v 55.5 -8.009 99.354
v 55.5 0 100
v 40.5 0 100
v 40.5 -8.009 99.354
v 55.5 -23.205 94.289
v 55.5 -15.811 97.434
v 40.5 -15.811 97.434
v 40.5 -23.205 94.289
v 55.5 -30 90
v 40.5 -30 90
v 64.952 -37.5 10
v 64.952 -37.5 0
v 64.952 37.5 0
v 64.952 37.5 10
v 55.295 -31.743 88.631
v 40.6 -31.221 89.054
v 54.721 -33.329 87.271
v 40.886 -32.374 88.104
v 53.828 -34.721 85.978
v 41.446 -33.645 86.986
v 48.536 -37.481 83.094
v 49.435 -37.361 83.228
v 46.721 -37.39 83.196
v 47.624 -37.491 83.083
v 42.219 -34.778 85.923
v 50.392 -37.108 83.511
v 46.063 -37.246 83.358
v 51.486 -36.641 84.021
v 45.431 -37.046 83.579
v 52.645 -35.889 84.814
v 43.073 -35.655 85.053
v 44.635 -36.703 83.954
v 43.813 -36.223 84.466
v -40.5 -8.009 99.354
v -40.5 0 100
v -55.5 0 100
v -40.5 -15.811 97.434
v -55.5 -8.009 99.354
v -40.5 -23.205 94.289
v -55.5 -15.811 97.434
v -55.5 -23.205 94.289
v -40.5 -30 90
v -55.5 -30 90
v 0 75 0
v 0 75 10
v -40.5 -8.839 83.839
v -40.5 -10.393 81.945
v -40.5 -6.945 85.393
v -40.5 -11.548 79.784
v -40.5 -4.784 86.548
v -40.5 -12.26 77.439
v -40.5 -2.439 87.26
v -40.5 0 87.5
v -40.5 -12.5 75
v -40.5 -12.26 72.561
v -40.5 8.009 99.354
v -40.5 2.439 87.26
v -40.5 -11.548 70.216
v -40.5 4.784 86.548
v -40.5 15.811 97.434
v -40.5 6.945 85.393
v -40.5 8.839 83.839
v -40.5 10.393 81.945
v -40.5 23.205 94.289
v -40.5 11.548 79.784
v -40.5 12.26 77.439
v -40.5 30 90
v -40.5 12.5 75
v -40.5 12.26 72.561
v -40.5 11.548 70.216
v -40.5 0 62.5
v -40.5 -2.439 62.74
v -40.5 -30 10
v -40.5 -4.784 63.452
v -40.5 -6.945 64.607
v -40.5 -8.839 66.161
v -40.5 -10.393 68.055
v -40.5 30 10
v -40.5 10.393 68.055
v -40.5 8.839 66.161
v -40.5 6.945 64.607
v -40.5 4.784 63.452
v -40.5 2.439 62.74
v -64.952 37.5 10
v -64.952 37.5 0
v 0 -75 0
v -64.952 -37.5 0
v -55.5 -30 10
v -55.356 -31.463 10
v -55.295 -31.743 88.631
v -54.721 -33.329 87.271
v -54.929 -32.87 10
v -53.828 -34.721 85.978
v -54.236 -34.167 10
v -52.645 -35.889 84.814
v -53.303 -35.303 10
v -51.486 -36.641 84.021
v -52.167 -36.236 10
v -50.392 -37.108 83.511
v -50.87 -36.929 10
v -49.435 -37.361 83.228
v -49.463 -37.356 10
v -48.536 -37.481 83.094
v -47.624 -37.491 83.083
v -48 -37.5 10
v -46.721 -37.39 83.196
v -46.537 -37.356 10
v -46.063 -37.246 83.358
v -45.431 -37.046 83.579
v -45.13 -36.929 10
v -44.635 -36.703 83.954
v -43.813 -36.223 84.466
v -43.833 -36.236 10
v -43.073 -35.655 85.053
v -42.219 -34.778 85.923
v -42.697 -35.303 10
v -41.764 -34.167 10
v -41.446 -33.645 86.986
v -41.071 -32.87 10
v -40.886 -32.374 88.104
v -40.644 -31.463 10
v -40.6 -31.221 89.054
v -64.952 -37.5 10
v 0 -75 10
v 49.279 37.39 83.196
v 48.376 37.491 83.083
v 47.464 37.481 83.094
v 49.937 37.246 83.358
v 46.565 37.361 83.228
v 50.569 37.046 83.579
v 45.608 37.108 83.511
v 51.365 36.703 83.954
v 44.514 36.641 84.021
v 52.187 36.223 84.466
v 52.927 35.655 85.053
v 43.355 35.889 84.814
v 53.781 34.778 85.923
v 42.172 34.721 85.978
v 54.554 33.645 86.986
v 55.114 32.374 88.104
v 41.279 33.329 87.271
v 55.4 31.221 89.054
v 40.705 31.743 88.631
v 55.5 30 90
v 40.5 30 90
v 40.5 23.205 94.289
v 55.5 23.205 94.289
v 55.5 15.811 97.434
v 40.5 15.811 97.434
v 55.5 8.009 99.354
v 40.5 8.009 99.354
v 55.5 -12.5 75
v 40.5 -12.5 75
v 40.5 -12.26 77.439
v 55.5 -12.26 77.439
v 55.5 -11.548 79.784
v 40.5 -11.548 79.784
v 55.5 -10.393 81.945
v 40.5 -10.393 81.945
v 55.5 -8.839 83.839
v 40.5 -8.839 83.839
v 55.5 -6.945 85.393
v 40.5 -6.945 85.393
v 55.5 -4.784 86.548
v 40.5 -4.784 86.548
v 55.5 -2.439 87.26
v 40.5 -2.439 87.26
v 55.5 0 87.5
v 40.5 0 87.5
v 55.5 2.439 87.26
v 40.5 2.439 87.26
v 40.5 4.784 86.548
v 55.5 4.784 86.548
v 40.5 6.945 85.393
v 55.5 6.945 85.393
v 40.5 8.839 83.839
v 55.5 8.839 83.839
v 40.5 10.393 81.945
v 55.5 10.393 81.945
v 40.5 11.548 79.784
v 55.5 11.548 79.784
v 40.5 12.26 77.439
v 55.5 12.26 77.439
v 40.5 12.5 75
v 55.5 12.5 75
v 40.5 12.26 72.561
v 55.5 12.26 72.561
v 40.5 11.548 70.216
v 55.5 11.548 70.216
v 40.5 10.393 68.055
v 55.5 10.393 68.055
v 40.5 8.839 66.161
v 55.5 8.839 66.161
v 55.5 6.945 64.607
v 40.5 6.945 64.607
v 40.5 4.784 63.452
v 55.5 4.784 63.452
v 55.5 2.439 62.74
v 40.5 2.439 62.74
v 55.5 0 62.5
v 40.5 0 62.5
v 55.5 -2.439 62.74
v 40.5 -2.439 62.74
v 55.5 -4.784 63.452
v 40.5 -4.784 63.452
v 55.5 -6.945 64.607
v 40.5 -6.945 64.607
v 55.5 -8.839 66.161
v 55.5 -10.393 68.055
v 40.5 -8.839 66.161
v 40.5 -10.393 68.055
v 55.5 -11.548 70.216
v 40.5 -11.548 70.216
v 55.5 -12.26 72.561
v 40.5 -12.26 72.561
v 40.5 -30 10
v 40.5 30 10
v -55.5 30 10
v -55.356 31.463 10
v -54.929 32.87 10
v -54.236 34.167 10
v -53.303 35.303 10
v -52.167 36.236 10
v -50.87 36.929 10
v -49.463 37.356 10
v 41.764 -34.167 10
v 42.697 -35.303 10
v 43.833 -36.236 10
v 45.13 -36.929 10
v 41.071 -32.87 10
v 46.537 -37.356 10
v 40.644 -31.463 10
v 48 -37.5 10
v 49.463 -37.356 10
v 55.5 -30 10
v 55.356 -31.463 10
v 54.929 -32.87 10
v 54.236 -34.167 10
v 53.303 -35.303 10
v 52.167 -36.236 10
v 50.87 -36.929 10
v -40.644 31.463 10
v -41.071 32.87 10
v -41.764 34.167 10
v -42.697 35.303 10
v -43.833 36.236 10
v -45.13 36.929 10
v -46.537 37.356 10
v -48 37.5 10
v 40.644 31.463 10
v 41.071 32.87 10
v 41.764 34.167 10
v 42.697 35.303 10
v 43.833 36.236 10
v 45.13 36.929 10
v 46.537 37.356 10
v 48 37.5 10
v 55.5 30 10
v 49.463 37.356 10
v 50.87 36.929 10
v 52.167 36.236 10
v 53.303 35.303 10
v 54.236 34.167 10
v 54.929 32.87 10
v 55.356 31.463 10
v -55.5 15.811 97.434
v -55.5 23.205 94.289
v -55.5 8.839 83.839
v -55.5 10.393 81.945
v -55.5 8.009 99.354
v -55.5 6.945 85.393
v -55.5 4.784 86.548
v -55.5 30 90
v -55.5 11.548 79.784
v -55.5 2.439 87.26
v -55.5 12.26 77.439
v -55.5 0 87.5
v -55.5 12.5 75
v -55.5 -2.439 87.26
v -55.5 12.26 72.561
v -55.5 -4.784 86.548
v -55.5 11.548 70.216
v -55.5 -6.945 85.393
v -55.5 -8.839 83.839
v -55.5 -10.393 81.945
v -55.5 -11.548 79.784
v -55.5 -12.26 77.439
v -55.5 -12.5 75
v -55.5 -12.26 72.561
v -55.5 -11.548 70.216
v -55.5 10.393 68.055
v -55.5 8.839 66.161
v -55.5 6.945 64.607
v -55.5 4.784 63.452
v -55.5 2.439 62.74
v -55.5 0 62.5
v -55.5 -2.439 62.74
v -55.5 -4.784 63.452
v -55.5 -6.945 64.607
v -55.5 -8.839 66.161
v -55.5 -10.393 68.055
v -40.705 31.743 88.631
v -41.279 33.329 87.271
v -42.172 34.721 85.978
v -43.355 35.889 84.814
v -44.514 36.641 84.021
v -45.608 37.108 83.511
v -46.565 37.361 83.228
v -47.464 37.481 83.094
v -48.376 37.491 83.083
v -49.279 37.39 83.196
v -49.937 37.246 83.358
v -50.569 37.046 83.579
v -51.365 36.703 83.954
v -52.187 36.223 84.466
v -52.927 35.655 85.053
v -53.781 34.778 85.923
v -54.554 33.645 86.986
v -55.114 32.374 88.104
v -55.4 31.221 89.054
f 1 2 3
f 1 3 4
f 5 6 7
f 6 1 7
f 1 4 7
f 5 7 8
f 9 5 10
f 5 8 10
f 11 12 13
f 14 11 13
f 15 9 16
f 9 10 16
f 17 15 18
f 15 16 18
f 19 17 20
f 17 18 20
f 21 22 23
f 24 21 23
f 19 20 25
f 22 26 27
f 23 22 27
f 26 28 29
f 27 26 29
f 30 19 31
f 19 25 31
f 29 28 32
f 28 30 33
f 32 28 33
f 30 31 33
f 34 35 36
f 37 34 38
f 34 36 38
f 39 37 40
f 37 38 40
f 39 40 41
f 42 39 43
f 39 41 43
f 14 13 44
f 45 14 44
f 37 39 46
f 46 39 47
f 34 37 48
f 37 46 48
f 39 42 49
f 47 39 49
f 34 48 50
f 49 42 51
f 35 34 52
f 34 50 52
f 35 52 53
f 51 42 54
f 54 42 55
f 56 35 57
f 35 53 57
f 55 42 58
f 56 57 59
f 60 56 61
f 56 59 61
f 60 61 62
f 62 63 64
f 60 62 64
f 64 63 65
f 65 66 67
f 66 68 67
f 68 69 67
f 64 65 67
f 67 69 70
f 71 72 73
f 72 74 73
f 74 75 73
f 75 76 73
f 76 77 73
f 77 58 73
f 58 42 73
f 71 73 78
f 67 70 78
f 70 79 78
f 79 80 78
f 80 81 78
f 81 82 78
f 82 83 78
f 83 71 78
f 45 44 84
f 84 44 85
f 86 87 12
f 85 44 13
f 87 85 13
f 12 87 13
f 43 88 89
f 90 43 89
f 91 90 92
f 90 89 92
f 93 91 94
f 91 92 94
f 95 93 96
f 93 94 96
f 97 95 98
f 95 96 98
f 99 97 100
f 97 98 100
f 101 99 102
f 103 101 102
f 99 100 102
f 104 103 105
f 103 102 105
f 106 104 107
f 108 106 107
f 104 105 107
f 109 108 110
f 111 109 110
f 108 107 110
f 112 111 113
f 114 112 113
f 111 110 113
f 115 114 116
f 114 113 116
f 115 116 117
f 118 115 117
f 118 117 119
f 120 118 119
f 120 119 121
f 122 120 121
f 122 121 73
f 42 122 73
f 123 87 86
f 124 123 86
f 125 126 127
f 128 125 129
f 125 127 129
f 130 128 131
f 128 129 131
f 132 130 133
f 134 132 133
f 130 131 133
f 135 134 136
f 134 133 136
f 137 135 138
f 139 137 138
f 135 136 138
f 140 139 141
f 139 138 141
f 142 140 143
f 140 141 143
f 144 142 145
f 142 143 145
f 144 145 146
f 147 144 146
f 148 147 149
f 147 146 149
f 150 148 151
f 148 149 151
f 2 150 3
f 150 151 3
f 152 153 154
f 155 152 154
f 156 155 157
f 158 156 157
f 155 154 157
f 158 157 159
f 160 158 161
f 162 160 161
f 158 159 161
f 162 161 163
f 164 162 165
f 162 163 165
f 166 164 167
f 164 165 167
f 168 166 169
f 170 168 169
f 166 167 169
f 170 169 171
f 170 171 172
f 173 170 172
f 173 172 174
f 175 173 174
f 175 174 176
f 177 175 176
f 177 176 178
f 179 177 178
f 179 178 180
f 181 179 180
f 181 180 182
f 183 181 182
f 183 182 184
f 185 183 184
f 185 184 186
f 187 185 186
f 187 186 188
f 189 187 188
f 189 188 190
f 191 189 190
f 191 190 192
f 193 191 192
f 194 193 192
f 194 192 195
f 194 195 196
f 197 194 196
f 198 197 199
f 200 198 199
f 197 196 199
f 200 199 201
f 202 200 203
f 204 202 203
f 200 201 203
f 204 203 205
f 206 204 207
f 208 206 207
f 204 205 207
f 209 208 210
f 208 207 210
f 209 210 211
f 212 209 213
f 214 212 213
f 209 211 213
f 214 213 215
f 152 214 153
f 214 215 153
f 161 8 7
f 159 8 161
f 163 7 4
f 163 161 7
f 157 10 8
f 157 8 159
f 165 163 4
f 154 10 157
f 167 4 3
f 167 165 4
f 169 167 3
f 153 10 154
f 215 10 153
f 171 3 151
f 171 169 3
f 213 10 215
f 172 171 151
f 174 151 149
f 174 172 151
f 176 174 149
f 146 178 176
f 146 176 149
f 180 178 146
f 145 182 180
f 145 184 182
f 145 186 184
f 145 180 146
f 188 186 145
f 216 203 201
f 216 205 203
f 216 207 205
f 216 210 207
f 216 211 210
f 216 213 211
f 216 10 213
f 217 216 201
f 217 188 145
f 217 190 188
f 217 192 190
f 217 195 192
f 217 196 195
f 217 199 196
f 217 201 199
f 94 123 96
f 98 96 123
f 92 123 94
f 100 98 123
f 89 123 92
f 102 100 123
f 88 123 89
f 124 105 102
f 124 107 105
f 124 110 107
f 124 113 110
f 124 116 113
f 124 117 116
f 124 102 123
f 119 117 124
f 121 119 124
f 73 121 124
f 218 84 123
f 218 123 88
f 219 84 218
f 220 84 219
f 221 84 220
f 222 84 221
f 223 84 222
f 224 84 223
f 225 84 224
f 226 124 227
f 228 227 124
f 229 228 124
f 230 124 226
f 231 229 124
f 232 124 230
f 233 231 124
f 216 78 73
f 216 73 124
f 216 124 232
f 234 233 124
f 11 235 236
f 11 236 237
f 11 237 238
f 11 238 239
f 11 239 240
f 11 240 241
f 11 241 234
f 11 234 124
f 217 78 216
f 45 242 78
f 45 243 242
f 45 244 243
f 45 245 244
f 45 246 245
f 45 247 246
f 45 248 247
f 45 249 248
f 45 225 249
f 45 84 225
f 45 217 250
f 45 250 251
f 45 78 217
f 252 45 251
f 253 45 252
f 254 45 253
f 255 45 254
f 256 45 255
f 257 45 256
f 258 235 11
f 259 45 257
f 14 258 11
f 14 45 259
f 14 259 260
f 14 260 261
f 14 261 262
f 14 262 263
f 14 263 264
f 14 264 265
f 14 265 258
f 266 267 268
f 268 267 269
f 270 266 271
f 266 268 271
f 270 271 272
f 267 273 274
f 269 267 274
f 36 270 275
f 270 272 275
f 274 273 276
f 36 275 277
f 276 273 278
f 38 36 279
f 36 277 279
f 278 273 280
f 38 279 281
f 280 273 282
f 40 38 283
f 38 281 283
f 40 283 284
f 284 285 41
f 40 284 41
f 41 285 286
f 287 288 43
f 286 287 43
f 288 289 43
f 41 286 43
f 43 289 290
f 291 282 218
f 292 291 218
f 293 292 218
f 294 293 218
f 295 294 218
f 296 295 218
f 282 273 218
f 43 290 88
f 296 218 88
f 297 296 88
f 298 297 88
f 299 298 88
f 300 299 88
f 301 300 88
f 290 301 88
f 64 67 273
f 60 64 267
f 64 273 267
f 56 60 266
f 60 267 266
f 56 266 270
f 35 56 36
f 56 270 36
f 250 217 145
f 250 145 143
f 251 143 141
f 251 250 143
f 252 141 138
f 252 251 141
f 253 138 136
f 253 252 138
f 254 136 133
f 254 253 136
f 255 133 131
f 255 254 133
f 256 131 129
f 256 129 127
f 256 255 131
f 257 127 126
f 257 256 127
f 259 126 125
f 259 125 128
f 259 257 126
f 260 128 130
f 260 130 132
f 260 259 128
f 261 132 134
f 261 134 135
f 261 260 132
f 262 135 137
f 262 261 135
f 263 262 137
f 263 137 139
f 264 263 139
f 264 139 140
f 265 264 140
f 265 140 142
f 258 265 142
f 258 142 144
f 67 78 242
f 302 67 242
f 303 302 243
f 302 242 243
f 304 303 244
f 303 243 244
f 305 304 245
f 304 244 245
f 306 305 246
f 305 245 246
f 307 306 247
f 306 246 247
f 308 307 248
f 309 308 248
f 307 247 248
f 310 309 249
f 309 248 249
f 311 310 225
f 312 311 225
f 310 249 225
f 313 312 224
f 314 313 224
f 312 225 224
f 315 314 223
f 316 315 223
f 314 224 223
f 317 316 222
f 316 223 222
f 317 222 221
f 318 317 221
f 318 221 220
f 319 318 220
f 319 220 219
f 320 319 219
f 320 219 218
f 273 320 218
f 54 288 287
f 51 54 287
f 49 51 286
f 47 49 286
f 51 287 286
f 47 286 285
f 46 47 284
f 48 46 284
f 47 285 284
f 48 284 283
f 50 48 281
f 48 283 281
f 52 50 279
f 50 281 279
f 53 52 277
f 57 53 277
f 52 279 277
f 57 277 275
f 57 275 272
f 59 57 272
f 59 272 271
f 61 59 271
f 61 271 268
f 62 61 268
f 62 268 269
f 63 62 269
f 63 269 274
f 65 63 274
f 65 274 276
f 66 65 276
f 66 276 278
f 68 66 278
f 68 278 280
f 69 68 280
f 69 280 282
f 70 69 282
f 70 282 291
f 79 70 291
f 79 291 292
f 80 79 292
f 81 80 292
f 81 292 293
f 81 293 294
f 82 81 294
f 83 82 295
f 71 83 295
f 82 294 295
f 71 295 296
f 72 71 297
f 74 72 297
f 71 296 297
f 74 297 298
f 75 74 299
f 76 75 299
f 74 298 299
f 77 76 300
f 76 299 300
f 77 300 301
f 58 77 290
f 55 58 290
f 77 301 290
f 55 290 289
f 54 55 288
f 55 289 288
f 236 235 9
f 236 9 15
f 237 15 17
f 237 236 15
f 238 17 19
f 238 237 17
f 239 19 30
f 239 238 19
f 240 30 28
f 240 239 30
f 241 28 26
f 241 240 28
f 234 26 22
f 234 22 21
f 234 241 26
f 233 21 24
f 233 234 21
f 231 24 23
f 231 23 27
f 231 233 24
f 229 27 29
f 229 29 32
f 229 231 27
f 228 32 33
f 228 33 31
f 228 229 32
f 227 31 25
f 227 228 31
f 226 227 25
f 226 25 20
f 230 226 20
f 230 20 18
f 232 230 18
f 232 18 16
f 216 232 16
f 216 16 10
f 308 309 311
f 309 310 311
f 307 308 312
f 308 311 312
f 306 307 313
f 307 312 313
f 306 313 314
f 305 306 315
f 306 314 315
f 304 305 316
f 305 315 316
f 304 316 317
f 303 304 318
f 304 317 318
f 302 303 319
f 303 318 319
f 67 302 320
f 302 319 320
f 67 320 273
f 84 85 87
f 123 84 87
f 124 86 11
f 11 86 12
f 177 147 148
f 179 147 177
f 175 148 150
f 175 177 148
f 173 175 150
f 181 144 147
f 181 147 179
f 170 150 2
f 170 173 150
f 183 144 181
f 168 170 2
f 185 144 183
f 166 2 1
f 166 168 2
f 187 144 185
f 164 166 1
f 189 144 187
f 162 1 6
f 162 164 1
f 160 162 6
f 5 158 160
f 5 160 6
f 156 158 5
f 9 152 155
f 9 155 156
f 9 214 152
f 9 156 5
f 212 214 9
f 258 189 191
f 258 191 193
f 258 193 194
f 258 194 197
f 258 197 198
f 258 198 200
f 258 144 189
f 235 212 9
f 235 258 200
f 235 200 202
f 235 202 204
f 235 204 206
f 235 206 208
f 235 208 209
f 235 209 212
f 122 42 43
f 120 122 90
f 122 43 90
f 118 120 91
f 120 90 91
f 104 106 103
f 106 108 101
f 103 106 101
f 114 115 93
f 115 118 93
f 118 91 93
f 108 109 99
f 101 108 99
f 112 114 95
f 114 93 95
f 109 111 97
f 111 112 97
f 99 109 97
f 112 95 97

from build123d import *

# Parameters (mm, degrees)
F1_DEPTH = 10
F3_DEPTH = 90
F4_R     = 12.5
F5_DEPTH = 120.4529052838


# Not quite as in the source:
# - a pattern or mirror of a feature is missing from the dataset's text; its kind, count and spacing are read off the source's solid


with BuildPart() as f1:
    # F0 (on Top) → F1 (new body)
    with BuildSketch(Plane.XY):
        Polygon((-64.9519052838, -37.5), (0, -75), (64.9519052838, -37.5), (64.9519052838, 37.5), (0, 75), (-64.9519052838, 37.5), align=None)
    extrude(amount=F1_DEPTH)

    # F2 (on face) → F3 (join)
    with BuildSketch(Plane.XY.offset(10)):
        with BuildLine():
            Line((-40.5, -30), (-40.5, 0))
            ThreePointArc((-40.5, 0), (-48, -7.5), (-55.5, 0))
            Line((-55.5, 0), (-55.5, -30))
            ThreePointArc((-55.5, -30), (-48, -37.5), (-40.5, -30))
        make_face()
        with BuildLine():
            ThreePointArc((-55.5, 0), (-48, -7.5), (-40.5, 0))
            ThreePointArc((-40.5, 0), (-48, 7.5), (-55.5, 0))
        make_face()
        with BuildLine():
            ThreePointArc((-55.5, 0), (-48, 7.5), (-40.5, 0))
            Line((-40.5, 0), (-40.5, 30))
            ThreePointArc((-40.5, 30), (-48, 37.5), (-55.5, 30))
            Line((-55.5, 30), (-55.5, 0))
        make_face()
    f3 = extrude(amount=F3_DEPTH)

    # F3_copies: F3 across plane
    add(f3.mirror(Plane(origin=(0, 0, 0), x_dir=(0, 0, 1), z_dir=(1, 0, 0))))

    # F4 (on face) → F5 (cut, through all)
    with BuildSketch(Plane(origin=(-55.5, 0, 0), x_dir=(0, -1, 0), z_dir=(-1, 0, 0))):
        with BuildLine():
            ThreePointArc((-38, 82.4961536185), (-34.2063872344, 86.4681103482), (-30, 90))
            Line((-30, 90), (-30, 100))
            Line((-30, 100), (-38, 100))
            Line((-38, 100), (-38, 82.4961536185))
        make_face()
        with BuildLine():
            ThreePointArc((-30, 90), (-15.8113883008, 97.4341649025), (0, 100))
            Line((0, 100), (-30, 100))
            Line((-30, 100), (-30, 90))
        make_face()
        with BuildLine():
            ThreePointArc((0, 100), (15.8113883008, 97.4341649025), (30, 90))
            Line((30, 90), (30, 100))
            Line((30, 100), (0, 100))
        make_face()
        with BuildLine():
            ThreePointArc((30, 90), (34.2063872344, 86.4681103482), (38, 82.4961536185))
            Line((38, 82.4961536185), (38, 100))
            Line((38, 100), (30, 100))
            Line((30, 100), (30, 90))
        make_face()
        with Locations((0, 75)):
            Circle(F4_R)
    extrude(amount=-F5_DEPTH, mode=Mode.SUBTRACT)


solid = f1.part
